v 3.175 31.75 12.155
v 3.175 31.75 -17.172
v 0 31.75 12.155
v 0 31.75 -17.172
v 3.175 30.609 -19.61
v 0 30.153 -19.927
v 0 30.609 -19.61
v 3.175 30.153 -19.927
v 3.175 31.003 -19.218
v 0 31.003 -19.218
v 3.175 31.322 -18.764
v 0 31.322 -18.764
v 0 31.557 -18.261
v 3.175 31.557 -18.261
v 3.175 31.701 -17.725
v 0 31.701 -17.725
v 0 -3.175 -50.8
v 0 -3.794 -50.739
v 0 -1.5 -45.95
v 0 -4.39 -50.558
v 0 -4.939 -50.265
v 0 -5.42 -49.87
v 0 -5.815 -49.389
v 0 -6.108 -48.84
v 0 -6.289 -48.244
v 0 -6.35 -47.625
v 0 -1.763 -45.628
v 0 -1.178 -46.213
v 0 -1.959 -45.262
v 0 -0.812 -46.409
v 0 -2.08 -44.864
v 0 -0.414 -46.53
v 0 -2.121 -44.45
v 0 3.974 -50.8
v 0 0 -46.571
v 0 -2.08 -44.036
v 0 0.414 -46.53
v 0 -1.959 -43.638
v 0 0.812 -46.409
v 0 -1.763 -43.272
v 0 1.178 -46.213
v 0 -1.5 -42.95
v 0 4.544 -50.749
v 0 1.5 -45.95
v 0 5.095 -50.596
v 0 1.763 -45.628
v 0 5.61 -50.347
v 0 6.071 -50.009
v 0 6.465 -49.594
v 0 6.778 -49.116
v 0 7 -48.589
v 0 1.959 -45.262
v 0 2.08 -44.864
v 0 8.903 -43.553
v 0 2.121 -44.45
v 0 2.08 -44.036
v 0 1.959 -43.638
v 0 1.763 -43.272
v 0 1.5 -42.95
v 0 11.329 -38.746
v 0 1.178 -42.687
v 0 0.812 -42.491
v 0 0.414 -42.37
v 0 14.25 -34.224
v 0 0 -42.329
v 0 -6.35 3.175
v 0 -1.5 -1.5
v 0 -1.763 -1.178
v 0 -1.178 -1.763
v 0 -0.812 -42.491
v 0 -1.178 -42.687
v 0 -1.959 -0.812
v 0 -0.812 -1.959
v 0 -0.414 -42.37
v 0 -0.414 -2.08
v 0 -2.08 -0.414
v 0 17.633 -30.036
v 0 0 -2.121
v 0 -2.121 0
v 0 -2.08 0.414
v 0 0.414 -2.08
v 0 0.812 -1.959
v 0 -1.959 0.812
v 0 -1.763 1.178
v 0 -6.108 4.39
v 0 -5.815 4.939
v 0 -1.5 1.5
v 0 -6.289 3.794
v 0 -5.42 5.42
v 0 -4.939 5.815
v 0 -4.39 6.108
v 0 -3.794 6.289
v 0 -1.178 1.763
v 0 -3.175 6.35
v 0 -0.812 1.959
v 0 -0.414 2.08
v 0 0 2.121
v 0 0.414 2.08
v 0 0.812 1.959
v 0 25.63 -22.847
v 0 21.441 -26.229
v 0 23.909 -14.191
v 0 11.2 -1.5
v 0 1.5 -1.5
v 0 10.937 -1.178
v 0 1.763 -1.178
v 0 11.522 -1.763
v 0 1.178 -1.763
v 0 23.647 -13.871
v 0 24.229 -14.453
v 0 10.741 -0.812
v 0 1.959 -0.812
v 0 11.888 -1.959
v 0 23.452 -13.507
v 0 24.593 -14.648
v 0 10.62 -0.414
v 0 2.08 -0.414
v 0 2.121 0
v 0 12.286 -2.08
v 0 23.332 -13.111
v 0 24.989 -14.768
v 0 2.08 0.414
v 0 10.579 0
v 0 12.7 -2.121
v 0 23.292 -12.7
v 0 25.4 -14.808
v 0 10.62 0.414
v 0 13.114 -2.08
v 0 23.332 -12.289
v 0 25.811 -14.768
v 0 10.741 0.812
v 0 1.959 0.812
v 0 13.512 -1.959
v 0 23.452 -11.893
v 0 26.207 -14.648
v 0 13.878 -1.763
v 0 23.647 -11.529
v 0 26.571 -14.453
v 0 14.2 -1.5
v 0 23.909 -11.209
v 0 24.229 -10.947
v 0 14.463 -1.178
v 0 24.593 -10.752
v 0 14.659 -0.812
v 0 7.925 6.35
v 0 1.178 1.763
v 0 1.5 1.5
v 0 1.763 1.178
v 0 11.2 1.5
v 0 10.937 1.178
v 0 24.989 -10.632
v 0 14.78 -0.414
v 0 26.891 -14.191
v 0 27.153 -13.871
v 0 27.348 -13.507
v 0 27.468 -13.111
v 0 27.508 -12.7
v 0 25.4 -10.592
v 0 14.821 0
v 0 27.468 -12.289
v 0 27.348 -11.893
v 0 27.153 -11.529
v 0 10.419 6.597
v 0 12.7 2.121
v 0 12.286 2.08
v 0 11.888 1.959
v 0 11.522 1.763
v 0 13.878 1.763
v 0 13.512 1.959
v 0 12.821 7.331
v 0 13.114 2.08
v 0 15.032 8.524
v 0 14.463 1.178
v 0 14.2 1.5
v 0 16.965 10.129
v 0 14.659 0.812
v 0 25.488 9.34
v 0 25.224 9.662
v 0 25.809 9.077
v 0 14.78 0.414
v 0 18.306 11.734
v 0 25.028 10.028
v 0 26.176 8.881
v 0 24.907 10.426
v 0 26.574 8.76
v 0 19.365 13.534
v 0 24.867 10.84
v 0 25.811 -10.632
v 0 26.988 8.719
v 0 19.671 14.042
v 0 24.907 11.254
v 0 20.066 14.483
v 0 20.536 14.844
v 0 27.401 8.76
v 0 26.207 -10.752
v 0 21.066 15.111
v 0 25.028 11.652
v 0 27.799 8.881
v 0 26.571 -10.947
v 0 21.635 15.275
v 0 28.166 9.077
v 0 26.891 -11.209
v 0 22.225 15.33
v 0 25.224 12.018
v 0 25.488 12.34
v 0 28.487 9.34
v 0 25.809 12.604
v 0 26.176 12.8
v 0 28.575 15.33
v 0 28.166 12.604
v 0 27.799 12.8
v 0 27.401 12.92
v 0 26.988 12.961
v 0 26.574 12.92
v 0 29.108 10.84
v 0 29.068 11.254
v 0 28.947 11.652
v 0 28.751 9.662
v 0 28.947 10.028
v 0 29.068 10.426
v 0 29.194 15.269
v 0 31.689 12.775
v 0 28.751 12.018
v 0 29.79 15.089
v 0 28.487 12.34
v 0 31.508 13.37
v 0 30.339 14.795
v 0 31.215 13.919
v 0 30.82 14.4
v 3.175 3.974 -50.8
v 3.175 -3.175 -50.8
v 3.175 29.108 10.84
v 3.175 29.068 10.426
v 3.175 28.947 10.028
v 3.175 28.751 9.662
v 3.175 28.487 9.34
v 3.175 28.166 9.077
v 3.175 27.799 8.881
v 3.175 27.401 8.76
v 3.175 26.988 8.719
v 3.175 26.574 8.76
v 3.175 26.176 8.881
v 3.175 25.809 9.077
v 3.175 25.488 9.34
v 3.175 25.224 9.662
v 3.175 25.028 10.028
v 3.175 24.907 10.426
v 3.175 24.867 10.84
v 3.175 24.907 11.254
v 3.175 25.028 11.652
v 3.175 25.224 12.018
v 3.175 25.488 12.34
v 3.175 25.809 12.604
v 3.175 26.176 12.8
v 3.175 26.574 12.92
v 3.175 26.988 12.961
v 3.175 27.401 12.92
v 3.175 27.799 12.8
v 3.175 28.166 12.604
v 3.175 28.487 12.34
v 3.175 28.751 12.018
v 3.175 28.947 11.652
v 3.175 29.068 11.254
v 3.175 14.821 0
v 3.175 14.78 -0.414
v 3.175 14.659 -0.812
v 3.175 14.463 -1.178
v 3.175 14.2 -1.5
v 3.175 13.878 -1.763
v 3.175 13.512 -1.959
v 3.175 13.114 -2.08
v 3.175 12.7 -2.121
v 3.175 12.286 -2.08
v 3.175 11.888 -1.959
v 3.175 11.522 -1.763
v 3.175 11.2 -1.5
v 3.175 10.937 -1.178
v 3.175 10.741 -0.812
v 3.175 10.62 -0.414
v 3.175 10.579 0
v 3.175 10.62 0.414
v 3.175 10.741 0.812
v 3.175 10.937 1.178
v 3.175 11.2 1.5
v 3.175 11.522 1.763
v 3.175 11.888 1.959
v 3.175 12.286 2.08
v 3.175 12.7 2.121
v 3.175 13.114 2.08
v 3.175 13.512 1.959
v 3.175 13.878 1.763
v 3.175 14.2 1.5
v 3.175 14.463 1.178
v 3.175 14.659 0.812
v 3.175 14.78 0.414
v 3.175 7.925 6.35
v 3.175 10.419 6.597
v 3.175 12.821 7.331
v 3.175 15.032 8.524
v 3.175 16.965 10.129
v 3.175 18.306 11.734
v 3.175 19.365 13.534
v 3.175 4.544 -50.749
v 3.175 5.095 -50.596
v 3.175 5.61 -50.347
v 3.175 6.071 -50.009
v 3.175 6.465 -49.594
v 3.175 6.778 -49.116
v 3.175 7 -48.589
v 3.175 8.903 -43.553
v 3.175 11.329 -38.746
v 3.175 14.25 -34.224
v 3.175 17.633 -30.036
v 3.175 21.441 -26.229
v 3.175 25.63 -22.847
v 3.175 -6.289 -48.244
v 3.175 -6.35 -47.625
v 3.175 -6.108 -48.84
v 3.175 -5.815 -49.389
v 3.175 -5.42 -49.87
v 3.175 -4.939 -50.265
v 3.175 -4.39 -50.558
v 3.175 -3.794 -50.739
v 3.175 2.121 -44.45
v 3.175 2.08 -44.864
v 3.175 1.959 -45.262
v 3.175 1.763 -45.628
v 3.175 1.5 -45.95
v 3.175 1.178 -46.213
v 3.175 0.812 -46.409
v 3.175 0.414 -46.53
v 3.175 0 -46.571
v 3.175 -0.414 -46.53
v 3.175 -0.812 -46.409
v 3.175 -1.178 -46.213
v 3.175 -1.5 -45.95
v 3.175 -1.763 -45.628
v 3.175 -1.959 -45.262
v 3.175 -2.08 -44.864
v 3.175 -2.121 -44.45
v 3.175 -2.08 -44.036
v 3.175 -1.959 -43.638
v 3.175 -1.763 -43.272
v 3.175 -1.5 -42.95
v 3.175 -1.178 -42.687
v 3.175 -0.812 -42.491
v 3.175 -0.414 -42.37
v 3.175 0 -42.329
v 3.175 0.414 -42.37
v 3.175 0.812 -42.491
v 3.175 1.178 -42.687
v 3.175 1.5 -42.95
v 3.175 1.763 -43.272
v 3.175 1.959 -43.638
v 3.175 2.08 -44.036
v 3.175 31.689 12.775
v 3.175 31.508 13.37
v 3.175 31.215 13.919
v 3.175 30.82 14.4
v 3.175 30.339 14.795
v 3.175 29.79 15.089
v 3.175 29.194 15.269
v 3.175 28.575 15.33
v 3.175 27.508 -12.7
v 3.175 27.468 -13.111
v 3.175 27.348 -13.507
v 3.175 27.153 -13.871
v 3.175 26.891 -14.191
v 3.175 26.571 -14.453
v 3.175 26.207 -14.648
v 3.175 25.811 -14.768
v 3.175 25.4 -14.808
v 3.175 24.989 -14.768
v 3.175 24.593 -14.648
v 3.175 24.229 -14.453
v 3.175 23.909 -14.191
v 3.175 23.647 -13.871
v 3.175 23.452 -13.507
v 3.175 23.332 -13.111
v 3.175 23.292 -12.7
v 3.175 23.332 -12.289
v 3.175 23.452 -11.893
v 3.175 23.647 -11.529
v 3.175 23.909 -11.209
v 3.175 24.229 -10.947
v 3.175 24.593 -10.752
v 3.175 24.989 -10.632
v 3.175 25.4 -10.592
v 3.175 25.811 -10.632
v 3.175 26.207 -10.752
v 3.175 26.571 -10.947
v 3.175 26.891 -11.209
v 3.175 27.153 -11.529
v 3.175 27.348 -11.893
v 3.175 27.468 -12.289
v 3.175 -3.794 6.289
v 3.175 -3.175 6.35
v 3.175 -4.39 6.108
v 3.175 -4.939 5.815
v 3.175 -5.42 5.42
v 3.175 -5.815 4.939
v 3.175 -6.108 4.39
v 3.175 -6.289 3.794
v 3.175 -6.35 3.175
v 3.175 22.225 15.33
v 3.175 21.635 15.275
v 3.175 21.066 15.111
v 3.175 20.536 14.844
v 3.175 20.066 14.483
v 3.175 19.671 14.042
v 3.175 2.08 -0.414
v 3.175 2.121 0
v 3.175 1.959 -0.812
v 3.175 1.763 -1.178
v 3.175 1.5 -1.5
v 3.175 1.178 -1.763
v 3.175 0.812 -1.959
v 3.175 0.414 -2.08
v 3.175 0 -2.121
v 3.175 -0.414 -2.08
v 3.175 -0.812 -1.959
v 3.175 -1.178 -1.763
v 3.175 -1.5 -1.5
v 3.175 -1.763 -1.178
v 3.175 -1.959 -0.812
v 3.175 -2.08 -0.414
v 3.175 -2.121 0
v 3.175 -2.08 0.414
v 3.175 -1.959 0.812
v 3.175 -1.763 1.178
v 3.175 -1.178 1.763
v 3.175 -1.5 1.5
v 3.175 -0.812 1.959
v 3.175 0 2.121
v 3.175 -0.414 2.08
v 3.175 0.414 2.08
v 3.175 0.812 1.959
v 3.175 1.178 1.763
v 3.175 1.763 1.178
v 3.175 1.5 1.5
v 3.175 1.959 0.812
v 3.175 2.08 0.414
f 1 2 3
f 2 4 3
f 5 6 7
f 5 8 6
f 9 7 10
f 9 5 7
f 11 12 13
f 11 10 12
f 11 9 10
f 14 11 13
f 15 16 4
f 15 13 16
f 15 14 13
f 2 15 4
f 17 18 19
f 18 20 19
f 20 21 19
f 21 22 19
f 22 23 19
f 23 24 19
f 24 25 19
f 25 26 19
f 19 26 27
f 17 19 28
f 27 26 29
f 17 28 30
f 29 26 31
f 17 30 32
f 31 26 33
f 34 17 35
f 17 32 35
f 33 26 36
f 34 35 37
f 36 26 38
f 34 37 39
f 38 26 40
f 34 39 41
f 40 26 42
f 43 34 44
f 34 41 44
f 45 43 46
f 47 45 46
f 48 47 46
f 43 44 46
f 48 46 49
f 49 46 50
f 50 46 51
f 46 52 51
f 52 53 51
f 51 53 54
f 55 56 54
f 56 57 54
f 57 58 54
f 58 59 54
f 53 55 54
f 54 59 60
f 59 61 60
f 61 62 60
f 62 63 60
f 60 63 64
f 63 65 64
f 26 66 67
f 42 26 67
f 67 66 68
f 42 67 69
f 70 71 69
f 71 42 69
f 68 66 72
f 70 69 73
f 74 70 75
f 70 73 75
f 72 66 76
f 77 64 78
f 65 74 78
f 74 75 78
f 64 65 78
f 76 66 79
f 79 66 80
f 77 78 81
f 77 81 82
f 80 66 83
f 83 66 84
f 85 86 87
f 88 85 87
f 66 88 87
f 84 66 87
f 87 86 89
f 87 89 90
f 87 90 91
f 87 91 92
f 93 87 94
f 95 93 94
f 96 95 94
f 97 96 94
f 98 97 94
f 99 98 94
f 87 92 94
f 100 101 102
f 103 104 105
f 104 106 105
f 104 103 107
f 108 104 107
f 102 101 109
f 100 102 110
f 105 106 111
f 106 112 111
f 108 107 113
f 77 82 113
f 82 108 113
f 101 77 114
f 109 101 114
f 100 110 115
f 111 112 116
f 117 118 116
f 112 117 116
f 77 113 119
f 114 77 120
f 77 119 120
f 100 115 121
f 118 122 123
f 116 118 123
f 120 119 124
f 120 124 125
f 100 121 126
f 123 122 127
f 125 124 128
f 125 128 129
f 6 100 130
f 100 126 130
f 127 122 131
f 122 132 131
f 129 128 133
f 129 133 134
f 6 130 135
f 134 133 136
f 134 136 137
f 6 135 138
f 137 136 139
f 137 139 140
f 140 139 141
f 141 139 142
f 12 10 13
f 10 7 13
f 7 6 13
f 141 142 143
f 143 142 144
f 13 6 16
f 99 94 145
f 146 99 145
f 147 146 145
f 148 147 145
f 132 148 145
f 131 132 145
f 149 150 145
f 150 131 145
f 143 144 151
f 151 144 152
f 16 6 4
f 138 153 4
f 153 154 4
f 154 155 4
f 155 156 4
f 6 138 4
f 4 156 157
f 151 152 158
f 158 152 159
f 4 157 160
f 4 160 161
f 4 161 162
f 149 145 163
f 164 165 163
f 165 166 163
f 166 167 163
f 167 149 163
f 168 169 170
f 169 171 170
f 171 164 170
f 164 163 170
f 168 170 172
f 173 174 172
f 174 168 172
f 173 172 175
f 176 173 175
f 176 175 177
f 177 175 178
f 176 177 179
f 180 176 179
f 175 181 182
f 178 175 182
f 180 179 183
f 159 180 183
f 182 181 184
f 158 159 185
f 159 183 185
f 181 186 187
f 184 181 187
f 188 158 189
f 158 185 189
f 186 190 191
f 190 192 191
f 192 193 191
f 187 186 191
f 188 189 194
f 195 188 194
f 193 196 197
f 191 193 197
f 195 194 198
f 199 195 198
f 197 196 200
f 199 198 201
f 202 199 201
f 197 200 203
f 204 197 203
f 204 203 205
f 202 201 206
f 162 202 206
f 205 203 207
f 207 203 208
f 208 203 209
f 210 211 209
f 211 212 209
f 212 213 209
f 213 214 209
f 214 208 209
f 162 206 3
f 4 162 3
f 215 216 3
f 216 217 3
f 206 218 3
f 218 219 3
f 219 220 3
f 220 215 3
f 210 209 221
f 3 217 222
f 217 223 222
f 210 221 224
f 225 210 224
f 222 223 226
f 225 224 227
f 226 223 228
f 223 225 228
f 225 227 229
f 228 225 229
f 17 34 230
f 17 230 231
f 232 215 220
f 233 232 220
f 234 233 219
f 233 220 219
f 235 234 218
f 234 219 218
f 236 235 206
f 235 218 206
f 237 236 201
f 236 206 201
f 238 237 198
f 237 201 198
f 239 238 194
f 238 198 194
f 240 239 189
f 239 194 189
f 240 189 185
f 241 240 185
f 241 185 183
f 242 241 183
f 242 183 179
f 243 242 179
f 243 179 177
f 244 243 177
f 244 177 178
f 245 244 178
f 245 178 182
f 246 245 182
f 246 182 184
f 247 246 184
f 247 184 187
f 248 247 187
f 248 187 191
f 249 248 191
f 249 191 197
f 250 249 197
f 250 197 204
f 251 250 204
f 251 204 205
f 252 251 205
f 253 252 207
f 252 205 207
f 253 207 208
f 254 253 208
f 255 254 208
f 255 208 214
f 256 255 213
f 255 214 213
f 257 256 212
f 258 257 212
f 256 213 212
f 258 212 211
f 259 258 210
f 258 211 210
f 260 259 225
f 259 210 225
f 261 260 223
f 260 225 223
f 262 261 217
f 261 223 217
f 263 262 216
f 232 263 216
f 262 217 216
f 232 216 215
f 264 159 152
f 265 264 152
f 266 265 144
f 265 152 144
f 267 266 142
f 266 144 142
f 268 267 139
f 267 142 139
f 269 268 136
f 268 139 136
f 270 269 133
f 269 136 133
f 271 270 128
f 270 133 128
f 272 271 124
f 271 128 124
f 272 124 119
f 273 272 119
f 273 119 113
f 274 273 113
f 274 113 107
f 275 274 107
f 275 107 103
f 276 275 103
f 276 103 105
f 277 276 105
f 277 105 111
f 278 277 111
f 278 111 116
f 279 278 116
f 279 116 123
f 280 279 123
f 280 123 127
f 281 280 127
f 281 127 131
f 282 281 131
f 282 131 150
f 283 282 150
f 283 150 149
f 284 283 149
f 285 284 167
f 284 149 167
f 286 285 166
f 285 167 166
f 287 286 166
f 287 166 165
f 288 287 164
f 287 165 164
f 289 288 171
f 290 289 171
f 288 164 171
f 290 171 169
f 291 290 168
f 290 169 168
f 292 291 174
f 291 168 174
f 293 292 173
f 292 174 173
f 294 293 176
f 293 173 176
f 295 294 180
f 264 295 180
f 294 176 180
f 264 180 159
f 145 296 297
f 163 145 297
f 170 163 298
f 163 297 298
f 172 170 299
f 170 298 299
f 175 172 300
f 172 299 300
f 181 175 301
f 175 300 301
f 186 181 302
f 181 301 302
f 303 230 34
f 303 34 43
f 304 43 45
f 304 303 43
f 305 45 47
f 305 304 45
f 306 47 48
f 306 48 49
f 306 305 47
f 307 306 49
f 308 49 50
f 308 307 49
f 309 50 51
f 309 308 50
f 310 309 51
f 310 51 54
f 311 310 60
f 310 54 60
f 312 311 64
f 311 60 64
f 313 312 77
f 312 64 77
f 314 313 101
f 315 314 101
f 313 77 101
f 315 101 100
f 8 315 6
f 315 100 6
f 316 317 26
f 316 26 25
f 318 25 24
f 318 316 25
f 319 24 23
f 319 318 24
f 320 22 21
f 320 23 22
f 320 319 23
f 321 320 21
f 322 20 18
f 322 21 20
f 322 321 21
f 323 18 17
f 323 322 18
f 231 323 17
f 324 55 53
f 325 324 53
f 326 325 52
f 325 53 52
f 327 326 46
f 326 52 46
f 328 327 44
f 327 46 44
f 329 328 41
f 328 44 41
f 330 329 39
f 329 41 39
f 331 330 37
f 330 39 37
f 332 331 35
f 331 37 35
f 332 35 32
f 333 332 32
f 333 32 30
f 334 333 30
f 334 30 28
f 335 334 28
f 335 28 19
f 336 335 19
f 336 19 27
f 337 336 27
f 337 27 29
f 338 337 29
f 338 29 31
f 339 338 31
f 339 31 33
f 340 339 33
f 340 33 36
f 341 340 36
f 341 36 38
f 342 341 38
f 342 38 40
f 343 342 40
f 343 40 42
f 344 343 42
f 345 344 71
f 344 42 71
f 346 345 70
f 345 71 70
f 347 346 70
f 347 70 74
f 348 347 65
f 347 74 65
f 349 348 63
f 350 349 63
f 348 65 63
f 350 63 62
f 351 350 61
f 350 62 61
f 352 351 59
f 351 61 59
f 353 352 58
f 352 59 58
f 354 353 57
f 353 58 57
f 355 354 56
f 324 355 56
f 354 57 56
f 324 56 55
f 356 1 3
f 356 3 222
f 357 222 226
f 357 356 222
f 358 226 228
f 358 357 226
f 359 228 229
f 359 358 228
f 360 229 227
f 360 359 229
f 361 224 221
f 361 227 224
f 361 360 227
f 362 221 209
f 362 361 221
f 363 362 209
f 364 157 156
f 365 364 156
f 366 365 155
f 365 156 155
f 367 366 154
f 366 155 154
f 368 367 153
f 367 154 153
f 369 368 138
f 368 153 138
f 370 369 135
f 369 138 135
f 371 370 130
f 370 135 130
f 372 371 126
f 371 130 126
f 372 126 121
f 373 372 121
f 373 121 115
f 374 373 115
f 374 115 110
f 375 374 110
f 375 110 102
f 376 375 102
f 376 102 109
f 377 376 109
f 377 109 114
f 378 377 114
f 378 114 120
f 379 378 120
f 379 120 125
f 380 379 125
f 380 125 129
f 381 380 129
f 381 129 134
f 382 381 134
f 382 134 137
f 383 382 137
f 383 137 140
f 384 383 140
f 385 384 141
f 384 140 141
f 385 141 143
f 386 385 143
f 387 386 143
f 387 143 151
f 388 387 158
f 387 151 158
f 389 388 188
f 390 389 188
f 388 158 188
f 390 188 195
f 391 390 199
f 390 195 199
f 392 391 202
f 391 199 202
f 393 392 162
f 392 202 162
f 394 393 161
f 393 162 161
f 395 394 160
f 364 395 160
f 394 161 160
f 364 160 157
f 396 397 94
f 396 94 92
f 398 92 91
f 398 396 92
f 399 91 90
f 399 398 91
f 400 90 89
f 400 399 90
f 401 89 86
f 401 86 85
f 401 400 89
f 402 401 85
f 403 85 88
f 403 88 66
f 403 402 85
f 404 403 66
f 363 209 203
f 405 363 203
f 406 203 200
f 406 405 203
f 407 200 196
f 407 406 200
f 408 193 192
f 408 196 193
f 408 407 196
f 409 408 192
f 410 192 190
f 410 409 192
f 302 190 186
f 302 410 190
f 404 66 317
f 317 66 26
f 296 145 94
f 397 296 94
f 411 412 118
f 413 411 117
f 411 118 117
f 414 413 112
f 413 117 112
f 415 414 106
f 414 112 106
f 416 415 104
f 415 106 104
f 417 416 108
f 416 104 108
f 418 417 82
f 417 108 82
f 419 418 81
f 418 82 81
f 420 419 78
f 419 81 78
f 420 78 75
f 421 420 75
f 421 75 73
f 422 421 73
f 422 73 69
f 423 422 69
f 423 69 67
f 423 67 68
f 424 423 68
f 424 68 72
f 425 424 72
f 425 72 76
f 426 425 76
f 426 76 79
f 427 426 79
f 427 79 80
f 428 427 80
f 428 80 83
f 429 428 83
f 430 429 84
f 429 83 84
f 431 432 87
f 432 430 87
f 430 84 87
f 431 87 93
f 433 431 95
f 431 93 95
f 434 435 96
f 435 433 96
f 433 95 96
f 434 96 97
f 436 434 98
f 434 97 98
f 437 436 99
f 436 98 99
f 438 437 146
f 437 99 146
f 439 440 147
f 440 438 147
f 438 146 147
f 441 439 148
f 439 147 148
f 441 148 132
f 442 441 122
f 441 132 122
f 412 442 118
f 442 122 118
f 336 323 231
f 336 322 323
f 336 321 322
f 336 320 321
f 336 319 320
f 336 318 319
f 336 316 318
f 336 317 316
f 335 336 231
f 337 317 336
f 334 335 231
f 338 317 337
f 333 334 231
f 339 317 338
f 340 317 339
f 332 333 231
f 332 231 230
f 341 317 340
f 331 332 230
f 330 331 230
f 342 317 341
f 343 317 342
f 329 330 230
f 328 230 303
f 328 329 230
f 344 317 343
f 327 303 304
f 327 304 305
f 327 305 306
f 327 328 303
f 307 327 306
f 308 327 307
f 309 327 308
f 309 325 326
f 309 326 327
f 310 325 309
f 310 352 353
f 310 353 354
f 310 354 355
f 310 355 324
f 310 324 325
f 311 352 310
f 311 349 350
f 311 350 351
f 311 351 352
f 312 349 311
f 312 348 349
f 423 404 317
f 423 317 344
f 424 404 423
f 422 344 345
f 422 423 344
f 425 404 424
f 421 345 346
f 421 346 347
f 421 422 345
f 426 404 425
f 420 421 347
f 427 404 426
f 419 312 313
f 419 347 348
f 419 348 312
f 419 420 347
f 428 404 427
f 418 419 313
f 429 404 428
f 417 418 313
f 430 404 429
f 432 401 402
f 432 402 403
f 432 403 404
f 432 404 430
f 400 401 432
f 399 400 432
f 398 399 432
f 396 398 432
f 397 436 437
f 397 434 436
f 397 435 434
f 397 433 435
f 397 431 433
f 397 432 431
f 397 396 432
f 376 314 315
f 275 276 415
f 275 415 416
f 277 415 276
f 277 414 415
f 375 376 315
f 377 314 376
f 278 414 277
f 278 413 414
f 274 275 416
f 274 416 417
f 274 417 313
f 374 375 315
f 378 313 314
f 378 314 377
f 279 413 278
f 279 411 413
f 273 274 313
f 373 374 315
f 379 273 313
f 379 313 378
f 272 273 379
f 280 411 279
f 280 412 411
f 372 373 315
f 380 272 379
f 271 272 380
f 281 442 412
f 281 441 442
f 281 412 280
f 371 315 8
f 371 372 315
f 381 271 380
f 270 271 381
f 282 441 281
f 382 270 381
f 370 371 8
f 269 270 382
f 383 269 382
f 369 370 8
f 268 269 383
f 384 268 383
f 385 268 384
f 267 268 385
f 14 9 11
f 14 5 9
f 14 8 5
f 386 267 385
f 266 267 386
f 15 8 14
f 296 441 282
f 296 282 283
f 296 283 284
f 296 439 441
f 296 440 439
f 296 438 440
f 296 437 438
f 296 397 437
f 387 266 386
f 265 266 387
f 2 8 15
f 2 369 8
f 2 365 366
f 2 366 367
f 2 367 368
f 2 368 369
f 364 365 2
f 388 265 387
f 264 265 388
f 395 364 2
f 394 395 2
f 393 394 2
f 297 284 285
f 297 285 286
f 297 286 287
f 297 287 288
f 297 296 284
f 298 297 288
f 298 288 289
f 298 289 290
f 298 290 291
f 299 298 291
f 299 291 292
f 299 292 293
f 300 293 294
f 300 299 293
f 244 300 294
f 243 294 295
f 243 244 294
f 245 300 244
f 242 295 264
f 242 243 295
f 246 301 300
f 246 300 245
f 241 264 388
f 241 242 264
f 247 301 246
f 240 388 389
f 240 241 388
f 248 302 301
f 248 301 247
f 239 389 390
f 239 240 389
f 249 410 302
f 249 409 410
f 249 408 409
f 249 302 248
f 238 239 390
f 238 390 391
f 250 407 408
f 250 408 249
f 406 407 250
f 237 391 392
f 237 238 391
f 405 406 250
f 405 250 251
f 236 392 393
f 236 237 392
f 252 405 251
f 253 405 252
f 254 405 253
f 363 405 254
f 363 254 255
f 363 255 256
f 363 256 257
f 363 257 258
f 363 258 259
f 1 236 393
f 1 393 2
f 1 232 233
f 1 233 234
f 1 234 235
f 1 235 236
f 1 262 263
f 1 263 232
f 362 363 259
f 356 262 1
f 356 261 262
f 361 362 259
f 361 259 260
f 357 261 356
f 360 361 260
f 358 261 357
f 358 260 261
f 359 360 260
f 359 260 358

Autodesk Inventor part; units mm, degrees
ref_plane "YZ Plane" through (0, 0, 0) normal (1, 0, 0) x (0, 1, 0)
ref_plane "XZ Plane" through (0, 0, 0) normal (0, 1, 0) x (-1, 0, 0)
ref_plane "XY Plane" through (0, 0, 0) normal (0, 0, 1) x (1, 0, 0)
sketch "Sketch1" plane through (0, 0, 0) normal (1, 0, 0) x (0, 1, 0)
  line L0 (0, 0) -> (12.7, 0)
  circle A0 centre (12.7, 0) radius 2.1209
  circle A1 centre (0, 0) radius 2.1209
  line L1 (12.7, 0) -> (12.7, 6.35)
  line L2 (12.7, 6.35) -> (19.05, 6.35)
  line L3 (19.05, 6.35) -> (-6.35, 6.35)
  line L4 (-6.35, 6.35) -> (-6.35, -6.35)
  line L5 (-6.35, -6.35) -> (19.05, -6.35)
  line L6 (19.05, -6.35) -> (19.05, 6.35)
  line L7 (19.05, -6.35) -> (19.05, -19.05)
  line L8 (19.05, -19.05) -> (31.75, -19.05)
  line L9 (31.75, -19.05) -> (31.75, -6.35)
  line L10 (31.75, -6.35) -> (19.05, 6.35)
  line L11 (19.05, -19.05) -> (6.35, -6.35)
  line L12 (19.05, -12.7) -> (25.4, -12.7)
  circle A2 centre (25.4, -12.7) radius 2.1082
  line L13 (0, 0) -> (0, -44.45)
  circle A3 centre (0, -44.45) radius 2.1209
  line L14 (-6.35, -6.35) -> (31.75, -6.35)
  line L15 (31.75, -6.35) -> (31.75, -50.8)
  line L16 (31.75, -50.8) -> (-6.35, -50.8)
  line L17 (-6.35, -50.8) -> (-6.35, -6.35)
  line L18 (6.35, -6.35) -> (6.35, -50.8)
  line L19 (19.05, -19.05) -> (6.35, -19.05)
  line L20 (31.75, -6.35) -> (31.75, 15.3303)
  line L21 (31.75, 15.3303) -> (28.0303, 15.3303)
  line L22 (31.75, 15.3303) -> (34.925, 15.3303)
  line L23 (31.75, -19.05) -> (34.925, -19.05)
  line L24 (34.925, -19.05) -> (34.925, 15.3303)
  line L25 (28.0303, 15.3303) -> (19.05, 15.3303)
  line L26 (19.05, 15.3303) -> (19.05, 6.35)
  line L27 (34.925, 10.8401) -> (19.05, 10.8401)
  circle A4 centre (26.9875, 10.8401) radius 2.1209
  dimension "d0" = 12.7
  dimension "d1" = 4.2418
  dimension "d2" = 4.2418
  dimension "d3" = 6.35
  dimension "d4" = 6.35
  dimension "d5" = 25.4
  dimension "d6" = 12.7
  dimension "d7" = 12.7
  dimension "d8" = 4.2164
  dimension "d11" = 44.45
  dimension "d15" = 12.7
  dimension "d19" = 3.175
  dimension "d20" = 4.2418
extrude "Extrusion1" add sketch "Sketch1" along normal blind 3.175 contours A1 L13 L5 L4 L3 L1 A0 L0 | L0 A0 L1 L2 L6 L5 L13 A1 | L5 L18 L16 L17 | L5 L7 L11 | L11 L19 L18 | L14 L9 L8 L7 | L6 L10 L14 | L26 L27 A4 L20 L10 | L26 L25 L21 L20 L27 A4
fillet "Fillet1" radius 50.8 1 edges at (1.5875, 6.35, -19.05)
fillet "Fillet3" radius 3.175 6 edges at (1.5875, 31.75, 15.3303) (1.5875, 31.75, -19.05) (1.5875, 6.35, -50.8) (1.5875, -6.35, -50.8) (1.5875, -6.35, 6.35) (1.5875, 19.05, 15.3303)
fillet "Fillet4" radius 12.7 1 edges at (1.5875, 19.05, 6.35)
properties part number "sled mounts"
